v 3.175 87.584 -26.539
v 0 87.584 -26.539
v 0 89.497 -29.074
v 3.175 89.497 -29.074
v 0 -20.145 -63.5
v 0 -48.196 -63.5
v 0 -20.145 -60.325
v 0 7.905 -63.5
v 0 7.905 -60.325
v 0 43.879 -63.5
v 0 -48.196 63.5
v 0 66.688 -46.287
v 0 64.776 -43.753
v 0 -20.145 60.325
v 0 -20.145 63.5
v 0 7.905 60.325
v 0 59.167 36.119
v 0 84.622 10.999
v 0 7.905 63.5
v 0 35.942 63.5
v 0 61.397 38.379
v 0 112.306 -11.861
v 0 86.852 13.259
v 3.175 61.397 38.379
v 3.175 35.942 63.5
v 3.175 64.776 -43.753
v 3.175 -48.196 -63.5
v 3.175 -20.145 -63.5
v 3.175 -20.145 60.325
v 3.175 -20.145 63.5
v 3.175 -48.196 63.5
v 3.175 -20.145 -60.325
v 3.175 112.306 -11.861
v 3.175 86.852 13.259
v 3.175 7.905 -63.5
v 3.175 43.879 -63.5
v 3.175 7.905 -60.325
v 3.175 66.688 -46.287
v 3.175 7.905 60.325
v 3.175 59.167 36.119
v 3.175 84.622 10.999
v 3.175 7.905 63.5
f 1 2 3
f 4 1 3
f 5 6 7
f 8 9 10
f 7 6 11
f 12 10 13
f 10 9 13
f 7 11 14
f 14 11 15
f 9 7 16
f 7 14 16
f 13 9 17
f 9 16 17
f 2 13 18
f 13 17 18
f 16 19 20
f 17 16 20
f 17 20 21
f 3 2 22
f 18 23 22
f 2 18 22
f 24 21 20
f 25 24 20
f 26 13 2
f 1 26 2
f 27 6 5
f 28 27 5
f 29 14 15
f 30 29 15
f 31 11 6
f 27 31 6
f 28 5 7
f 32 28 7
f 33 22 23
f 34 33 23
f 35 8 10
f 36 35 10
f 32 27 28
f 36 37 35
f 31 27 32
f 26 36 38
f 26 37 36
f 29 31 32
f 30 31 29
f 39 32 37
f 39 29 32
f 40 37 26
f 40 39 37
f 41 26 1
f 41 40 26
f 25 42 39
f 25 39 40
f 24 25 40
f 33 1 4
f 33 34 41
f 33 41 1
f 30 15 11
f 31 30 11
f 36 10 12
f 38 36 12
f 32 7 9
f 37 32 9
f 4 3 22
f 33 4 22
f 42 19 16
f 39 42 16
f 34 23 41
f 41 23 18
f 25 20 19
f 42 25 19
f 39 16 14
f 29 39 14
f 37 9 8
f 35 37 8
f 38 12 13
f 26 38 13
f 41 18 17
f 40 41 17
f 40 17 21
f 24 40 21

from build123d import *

# Parameters (mm, degrees)
F1_DEPTH = 3.175


with BuildPart() as f1:
    # F0 (on Right) → F1 (new body)
    with BuildSketch(Plane.YZ):
        Polygon((-48.195562, 60.325), (-48.195562, 0), (-48.195562, -63.5), (-20.145495, -63.5), (-20.145495, -60.325), (7.904572, -60.325), (7.904572, -63.5), (43.879438, -63.5), (66.688176, -46.286863), (64.775605, -43.752558), (87.584343, -26.539421), (89.496914, -29.073725), (112.305652, -11.860588), (86.852017, 13.258684), (84.621845, 10.998826), (59.166806, 36.119484), (61.396978, 38.379342), (35.941938, 63.5), (7.904572, 63.5), (7.904572, 60.325), (-20.145495, 60.325), (-20.145495, 63.5), (-48.195562, 63.5), align=None)
    extrude(amount=F1_DEPTH)


solid = f1.part
